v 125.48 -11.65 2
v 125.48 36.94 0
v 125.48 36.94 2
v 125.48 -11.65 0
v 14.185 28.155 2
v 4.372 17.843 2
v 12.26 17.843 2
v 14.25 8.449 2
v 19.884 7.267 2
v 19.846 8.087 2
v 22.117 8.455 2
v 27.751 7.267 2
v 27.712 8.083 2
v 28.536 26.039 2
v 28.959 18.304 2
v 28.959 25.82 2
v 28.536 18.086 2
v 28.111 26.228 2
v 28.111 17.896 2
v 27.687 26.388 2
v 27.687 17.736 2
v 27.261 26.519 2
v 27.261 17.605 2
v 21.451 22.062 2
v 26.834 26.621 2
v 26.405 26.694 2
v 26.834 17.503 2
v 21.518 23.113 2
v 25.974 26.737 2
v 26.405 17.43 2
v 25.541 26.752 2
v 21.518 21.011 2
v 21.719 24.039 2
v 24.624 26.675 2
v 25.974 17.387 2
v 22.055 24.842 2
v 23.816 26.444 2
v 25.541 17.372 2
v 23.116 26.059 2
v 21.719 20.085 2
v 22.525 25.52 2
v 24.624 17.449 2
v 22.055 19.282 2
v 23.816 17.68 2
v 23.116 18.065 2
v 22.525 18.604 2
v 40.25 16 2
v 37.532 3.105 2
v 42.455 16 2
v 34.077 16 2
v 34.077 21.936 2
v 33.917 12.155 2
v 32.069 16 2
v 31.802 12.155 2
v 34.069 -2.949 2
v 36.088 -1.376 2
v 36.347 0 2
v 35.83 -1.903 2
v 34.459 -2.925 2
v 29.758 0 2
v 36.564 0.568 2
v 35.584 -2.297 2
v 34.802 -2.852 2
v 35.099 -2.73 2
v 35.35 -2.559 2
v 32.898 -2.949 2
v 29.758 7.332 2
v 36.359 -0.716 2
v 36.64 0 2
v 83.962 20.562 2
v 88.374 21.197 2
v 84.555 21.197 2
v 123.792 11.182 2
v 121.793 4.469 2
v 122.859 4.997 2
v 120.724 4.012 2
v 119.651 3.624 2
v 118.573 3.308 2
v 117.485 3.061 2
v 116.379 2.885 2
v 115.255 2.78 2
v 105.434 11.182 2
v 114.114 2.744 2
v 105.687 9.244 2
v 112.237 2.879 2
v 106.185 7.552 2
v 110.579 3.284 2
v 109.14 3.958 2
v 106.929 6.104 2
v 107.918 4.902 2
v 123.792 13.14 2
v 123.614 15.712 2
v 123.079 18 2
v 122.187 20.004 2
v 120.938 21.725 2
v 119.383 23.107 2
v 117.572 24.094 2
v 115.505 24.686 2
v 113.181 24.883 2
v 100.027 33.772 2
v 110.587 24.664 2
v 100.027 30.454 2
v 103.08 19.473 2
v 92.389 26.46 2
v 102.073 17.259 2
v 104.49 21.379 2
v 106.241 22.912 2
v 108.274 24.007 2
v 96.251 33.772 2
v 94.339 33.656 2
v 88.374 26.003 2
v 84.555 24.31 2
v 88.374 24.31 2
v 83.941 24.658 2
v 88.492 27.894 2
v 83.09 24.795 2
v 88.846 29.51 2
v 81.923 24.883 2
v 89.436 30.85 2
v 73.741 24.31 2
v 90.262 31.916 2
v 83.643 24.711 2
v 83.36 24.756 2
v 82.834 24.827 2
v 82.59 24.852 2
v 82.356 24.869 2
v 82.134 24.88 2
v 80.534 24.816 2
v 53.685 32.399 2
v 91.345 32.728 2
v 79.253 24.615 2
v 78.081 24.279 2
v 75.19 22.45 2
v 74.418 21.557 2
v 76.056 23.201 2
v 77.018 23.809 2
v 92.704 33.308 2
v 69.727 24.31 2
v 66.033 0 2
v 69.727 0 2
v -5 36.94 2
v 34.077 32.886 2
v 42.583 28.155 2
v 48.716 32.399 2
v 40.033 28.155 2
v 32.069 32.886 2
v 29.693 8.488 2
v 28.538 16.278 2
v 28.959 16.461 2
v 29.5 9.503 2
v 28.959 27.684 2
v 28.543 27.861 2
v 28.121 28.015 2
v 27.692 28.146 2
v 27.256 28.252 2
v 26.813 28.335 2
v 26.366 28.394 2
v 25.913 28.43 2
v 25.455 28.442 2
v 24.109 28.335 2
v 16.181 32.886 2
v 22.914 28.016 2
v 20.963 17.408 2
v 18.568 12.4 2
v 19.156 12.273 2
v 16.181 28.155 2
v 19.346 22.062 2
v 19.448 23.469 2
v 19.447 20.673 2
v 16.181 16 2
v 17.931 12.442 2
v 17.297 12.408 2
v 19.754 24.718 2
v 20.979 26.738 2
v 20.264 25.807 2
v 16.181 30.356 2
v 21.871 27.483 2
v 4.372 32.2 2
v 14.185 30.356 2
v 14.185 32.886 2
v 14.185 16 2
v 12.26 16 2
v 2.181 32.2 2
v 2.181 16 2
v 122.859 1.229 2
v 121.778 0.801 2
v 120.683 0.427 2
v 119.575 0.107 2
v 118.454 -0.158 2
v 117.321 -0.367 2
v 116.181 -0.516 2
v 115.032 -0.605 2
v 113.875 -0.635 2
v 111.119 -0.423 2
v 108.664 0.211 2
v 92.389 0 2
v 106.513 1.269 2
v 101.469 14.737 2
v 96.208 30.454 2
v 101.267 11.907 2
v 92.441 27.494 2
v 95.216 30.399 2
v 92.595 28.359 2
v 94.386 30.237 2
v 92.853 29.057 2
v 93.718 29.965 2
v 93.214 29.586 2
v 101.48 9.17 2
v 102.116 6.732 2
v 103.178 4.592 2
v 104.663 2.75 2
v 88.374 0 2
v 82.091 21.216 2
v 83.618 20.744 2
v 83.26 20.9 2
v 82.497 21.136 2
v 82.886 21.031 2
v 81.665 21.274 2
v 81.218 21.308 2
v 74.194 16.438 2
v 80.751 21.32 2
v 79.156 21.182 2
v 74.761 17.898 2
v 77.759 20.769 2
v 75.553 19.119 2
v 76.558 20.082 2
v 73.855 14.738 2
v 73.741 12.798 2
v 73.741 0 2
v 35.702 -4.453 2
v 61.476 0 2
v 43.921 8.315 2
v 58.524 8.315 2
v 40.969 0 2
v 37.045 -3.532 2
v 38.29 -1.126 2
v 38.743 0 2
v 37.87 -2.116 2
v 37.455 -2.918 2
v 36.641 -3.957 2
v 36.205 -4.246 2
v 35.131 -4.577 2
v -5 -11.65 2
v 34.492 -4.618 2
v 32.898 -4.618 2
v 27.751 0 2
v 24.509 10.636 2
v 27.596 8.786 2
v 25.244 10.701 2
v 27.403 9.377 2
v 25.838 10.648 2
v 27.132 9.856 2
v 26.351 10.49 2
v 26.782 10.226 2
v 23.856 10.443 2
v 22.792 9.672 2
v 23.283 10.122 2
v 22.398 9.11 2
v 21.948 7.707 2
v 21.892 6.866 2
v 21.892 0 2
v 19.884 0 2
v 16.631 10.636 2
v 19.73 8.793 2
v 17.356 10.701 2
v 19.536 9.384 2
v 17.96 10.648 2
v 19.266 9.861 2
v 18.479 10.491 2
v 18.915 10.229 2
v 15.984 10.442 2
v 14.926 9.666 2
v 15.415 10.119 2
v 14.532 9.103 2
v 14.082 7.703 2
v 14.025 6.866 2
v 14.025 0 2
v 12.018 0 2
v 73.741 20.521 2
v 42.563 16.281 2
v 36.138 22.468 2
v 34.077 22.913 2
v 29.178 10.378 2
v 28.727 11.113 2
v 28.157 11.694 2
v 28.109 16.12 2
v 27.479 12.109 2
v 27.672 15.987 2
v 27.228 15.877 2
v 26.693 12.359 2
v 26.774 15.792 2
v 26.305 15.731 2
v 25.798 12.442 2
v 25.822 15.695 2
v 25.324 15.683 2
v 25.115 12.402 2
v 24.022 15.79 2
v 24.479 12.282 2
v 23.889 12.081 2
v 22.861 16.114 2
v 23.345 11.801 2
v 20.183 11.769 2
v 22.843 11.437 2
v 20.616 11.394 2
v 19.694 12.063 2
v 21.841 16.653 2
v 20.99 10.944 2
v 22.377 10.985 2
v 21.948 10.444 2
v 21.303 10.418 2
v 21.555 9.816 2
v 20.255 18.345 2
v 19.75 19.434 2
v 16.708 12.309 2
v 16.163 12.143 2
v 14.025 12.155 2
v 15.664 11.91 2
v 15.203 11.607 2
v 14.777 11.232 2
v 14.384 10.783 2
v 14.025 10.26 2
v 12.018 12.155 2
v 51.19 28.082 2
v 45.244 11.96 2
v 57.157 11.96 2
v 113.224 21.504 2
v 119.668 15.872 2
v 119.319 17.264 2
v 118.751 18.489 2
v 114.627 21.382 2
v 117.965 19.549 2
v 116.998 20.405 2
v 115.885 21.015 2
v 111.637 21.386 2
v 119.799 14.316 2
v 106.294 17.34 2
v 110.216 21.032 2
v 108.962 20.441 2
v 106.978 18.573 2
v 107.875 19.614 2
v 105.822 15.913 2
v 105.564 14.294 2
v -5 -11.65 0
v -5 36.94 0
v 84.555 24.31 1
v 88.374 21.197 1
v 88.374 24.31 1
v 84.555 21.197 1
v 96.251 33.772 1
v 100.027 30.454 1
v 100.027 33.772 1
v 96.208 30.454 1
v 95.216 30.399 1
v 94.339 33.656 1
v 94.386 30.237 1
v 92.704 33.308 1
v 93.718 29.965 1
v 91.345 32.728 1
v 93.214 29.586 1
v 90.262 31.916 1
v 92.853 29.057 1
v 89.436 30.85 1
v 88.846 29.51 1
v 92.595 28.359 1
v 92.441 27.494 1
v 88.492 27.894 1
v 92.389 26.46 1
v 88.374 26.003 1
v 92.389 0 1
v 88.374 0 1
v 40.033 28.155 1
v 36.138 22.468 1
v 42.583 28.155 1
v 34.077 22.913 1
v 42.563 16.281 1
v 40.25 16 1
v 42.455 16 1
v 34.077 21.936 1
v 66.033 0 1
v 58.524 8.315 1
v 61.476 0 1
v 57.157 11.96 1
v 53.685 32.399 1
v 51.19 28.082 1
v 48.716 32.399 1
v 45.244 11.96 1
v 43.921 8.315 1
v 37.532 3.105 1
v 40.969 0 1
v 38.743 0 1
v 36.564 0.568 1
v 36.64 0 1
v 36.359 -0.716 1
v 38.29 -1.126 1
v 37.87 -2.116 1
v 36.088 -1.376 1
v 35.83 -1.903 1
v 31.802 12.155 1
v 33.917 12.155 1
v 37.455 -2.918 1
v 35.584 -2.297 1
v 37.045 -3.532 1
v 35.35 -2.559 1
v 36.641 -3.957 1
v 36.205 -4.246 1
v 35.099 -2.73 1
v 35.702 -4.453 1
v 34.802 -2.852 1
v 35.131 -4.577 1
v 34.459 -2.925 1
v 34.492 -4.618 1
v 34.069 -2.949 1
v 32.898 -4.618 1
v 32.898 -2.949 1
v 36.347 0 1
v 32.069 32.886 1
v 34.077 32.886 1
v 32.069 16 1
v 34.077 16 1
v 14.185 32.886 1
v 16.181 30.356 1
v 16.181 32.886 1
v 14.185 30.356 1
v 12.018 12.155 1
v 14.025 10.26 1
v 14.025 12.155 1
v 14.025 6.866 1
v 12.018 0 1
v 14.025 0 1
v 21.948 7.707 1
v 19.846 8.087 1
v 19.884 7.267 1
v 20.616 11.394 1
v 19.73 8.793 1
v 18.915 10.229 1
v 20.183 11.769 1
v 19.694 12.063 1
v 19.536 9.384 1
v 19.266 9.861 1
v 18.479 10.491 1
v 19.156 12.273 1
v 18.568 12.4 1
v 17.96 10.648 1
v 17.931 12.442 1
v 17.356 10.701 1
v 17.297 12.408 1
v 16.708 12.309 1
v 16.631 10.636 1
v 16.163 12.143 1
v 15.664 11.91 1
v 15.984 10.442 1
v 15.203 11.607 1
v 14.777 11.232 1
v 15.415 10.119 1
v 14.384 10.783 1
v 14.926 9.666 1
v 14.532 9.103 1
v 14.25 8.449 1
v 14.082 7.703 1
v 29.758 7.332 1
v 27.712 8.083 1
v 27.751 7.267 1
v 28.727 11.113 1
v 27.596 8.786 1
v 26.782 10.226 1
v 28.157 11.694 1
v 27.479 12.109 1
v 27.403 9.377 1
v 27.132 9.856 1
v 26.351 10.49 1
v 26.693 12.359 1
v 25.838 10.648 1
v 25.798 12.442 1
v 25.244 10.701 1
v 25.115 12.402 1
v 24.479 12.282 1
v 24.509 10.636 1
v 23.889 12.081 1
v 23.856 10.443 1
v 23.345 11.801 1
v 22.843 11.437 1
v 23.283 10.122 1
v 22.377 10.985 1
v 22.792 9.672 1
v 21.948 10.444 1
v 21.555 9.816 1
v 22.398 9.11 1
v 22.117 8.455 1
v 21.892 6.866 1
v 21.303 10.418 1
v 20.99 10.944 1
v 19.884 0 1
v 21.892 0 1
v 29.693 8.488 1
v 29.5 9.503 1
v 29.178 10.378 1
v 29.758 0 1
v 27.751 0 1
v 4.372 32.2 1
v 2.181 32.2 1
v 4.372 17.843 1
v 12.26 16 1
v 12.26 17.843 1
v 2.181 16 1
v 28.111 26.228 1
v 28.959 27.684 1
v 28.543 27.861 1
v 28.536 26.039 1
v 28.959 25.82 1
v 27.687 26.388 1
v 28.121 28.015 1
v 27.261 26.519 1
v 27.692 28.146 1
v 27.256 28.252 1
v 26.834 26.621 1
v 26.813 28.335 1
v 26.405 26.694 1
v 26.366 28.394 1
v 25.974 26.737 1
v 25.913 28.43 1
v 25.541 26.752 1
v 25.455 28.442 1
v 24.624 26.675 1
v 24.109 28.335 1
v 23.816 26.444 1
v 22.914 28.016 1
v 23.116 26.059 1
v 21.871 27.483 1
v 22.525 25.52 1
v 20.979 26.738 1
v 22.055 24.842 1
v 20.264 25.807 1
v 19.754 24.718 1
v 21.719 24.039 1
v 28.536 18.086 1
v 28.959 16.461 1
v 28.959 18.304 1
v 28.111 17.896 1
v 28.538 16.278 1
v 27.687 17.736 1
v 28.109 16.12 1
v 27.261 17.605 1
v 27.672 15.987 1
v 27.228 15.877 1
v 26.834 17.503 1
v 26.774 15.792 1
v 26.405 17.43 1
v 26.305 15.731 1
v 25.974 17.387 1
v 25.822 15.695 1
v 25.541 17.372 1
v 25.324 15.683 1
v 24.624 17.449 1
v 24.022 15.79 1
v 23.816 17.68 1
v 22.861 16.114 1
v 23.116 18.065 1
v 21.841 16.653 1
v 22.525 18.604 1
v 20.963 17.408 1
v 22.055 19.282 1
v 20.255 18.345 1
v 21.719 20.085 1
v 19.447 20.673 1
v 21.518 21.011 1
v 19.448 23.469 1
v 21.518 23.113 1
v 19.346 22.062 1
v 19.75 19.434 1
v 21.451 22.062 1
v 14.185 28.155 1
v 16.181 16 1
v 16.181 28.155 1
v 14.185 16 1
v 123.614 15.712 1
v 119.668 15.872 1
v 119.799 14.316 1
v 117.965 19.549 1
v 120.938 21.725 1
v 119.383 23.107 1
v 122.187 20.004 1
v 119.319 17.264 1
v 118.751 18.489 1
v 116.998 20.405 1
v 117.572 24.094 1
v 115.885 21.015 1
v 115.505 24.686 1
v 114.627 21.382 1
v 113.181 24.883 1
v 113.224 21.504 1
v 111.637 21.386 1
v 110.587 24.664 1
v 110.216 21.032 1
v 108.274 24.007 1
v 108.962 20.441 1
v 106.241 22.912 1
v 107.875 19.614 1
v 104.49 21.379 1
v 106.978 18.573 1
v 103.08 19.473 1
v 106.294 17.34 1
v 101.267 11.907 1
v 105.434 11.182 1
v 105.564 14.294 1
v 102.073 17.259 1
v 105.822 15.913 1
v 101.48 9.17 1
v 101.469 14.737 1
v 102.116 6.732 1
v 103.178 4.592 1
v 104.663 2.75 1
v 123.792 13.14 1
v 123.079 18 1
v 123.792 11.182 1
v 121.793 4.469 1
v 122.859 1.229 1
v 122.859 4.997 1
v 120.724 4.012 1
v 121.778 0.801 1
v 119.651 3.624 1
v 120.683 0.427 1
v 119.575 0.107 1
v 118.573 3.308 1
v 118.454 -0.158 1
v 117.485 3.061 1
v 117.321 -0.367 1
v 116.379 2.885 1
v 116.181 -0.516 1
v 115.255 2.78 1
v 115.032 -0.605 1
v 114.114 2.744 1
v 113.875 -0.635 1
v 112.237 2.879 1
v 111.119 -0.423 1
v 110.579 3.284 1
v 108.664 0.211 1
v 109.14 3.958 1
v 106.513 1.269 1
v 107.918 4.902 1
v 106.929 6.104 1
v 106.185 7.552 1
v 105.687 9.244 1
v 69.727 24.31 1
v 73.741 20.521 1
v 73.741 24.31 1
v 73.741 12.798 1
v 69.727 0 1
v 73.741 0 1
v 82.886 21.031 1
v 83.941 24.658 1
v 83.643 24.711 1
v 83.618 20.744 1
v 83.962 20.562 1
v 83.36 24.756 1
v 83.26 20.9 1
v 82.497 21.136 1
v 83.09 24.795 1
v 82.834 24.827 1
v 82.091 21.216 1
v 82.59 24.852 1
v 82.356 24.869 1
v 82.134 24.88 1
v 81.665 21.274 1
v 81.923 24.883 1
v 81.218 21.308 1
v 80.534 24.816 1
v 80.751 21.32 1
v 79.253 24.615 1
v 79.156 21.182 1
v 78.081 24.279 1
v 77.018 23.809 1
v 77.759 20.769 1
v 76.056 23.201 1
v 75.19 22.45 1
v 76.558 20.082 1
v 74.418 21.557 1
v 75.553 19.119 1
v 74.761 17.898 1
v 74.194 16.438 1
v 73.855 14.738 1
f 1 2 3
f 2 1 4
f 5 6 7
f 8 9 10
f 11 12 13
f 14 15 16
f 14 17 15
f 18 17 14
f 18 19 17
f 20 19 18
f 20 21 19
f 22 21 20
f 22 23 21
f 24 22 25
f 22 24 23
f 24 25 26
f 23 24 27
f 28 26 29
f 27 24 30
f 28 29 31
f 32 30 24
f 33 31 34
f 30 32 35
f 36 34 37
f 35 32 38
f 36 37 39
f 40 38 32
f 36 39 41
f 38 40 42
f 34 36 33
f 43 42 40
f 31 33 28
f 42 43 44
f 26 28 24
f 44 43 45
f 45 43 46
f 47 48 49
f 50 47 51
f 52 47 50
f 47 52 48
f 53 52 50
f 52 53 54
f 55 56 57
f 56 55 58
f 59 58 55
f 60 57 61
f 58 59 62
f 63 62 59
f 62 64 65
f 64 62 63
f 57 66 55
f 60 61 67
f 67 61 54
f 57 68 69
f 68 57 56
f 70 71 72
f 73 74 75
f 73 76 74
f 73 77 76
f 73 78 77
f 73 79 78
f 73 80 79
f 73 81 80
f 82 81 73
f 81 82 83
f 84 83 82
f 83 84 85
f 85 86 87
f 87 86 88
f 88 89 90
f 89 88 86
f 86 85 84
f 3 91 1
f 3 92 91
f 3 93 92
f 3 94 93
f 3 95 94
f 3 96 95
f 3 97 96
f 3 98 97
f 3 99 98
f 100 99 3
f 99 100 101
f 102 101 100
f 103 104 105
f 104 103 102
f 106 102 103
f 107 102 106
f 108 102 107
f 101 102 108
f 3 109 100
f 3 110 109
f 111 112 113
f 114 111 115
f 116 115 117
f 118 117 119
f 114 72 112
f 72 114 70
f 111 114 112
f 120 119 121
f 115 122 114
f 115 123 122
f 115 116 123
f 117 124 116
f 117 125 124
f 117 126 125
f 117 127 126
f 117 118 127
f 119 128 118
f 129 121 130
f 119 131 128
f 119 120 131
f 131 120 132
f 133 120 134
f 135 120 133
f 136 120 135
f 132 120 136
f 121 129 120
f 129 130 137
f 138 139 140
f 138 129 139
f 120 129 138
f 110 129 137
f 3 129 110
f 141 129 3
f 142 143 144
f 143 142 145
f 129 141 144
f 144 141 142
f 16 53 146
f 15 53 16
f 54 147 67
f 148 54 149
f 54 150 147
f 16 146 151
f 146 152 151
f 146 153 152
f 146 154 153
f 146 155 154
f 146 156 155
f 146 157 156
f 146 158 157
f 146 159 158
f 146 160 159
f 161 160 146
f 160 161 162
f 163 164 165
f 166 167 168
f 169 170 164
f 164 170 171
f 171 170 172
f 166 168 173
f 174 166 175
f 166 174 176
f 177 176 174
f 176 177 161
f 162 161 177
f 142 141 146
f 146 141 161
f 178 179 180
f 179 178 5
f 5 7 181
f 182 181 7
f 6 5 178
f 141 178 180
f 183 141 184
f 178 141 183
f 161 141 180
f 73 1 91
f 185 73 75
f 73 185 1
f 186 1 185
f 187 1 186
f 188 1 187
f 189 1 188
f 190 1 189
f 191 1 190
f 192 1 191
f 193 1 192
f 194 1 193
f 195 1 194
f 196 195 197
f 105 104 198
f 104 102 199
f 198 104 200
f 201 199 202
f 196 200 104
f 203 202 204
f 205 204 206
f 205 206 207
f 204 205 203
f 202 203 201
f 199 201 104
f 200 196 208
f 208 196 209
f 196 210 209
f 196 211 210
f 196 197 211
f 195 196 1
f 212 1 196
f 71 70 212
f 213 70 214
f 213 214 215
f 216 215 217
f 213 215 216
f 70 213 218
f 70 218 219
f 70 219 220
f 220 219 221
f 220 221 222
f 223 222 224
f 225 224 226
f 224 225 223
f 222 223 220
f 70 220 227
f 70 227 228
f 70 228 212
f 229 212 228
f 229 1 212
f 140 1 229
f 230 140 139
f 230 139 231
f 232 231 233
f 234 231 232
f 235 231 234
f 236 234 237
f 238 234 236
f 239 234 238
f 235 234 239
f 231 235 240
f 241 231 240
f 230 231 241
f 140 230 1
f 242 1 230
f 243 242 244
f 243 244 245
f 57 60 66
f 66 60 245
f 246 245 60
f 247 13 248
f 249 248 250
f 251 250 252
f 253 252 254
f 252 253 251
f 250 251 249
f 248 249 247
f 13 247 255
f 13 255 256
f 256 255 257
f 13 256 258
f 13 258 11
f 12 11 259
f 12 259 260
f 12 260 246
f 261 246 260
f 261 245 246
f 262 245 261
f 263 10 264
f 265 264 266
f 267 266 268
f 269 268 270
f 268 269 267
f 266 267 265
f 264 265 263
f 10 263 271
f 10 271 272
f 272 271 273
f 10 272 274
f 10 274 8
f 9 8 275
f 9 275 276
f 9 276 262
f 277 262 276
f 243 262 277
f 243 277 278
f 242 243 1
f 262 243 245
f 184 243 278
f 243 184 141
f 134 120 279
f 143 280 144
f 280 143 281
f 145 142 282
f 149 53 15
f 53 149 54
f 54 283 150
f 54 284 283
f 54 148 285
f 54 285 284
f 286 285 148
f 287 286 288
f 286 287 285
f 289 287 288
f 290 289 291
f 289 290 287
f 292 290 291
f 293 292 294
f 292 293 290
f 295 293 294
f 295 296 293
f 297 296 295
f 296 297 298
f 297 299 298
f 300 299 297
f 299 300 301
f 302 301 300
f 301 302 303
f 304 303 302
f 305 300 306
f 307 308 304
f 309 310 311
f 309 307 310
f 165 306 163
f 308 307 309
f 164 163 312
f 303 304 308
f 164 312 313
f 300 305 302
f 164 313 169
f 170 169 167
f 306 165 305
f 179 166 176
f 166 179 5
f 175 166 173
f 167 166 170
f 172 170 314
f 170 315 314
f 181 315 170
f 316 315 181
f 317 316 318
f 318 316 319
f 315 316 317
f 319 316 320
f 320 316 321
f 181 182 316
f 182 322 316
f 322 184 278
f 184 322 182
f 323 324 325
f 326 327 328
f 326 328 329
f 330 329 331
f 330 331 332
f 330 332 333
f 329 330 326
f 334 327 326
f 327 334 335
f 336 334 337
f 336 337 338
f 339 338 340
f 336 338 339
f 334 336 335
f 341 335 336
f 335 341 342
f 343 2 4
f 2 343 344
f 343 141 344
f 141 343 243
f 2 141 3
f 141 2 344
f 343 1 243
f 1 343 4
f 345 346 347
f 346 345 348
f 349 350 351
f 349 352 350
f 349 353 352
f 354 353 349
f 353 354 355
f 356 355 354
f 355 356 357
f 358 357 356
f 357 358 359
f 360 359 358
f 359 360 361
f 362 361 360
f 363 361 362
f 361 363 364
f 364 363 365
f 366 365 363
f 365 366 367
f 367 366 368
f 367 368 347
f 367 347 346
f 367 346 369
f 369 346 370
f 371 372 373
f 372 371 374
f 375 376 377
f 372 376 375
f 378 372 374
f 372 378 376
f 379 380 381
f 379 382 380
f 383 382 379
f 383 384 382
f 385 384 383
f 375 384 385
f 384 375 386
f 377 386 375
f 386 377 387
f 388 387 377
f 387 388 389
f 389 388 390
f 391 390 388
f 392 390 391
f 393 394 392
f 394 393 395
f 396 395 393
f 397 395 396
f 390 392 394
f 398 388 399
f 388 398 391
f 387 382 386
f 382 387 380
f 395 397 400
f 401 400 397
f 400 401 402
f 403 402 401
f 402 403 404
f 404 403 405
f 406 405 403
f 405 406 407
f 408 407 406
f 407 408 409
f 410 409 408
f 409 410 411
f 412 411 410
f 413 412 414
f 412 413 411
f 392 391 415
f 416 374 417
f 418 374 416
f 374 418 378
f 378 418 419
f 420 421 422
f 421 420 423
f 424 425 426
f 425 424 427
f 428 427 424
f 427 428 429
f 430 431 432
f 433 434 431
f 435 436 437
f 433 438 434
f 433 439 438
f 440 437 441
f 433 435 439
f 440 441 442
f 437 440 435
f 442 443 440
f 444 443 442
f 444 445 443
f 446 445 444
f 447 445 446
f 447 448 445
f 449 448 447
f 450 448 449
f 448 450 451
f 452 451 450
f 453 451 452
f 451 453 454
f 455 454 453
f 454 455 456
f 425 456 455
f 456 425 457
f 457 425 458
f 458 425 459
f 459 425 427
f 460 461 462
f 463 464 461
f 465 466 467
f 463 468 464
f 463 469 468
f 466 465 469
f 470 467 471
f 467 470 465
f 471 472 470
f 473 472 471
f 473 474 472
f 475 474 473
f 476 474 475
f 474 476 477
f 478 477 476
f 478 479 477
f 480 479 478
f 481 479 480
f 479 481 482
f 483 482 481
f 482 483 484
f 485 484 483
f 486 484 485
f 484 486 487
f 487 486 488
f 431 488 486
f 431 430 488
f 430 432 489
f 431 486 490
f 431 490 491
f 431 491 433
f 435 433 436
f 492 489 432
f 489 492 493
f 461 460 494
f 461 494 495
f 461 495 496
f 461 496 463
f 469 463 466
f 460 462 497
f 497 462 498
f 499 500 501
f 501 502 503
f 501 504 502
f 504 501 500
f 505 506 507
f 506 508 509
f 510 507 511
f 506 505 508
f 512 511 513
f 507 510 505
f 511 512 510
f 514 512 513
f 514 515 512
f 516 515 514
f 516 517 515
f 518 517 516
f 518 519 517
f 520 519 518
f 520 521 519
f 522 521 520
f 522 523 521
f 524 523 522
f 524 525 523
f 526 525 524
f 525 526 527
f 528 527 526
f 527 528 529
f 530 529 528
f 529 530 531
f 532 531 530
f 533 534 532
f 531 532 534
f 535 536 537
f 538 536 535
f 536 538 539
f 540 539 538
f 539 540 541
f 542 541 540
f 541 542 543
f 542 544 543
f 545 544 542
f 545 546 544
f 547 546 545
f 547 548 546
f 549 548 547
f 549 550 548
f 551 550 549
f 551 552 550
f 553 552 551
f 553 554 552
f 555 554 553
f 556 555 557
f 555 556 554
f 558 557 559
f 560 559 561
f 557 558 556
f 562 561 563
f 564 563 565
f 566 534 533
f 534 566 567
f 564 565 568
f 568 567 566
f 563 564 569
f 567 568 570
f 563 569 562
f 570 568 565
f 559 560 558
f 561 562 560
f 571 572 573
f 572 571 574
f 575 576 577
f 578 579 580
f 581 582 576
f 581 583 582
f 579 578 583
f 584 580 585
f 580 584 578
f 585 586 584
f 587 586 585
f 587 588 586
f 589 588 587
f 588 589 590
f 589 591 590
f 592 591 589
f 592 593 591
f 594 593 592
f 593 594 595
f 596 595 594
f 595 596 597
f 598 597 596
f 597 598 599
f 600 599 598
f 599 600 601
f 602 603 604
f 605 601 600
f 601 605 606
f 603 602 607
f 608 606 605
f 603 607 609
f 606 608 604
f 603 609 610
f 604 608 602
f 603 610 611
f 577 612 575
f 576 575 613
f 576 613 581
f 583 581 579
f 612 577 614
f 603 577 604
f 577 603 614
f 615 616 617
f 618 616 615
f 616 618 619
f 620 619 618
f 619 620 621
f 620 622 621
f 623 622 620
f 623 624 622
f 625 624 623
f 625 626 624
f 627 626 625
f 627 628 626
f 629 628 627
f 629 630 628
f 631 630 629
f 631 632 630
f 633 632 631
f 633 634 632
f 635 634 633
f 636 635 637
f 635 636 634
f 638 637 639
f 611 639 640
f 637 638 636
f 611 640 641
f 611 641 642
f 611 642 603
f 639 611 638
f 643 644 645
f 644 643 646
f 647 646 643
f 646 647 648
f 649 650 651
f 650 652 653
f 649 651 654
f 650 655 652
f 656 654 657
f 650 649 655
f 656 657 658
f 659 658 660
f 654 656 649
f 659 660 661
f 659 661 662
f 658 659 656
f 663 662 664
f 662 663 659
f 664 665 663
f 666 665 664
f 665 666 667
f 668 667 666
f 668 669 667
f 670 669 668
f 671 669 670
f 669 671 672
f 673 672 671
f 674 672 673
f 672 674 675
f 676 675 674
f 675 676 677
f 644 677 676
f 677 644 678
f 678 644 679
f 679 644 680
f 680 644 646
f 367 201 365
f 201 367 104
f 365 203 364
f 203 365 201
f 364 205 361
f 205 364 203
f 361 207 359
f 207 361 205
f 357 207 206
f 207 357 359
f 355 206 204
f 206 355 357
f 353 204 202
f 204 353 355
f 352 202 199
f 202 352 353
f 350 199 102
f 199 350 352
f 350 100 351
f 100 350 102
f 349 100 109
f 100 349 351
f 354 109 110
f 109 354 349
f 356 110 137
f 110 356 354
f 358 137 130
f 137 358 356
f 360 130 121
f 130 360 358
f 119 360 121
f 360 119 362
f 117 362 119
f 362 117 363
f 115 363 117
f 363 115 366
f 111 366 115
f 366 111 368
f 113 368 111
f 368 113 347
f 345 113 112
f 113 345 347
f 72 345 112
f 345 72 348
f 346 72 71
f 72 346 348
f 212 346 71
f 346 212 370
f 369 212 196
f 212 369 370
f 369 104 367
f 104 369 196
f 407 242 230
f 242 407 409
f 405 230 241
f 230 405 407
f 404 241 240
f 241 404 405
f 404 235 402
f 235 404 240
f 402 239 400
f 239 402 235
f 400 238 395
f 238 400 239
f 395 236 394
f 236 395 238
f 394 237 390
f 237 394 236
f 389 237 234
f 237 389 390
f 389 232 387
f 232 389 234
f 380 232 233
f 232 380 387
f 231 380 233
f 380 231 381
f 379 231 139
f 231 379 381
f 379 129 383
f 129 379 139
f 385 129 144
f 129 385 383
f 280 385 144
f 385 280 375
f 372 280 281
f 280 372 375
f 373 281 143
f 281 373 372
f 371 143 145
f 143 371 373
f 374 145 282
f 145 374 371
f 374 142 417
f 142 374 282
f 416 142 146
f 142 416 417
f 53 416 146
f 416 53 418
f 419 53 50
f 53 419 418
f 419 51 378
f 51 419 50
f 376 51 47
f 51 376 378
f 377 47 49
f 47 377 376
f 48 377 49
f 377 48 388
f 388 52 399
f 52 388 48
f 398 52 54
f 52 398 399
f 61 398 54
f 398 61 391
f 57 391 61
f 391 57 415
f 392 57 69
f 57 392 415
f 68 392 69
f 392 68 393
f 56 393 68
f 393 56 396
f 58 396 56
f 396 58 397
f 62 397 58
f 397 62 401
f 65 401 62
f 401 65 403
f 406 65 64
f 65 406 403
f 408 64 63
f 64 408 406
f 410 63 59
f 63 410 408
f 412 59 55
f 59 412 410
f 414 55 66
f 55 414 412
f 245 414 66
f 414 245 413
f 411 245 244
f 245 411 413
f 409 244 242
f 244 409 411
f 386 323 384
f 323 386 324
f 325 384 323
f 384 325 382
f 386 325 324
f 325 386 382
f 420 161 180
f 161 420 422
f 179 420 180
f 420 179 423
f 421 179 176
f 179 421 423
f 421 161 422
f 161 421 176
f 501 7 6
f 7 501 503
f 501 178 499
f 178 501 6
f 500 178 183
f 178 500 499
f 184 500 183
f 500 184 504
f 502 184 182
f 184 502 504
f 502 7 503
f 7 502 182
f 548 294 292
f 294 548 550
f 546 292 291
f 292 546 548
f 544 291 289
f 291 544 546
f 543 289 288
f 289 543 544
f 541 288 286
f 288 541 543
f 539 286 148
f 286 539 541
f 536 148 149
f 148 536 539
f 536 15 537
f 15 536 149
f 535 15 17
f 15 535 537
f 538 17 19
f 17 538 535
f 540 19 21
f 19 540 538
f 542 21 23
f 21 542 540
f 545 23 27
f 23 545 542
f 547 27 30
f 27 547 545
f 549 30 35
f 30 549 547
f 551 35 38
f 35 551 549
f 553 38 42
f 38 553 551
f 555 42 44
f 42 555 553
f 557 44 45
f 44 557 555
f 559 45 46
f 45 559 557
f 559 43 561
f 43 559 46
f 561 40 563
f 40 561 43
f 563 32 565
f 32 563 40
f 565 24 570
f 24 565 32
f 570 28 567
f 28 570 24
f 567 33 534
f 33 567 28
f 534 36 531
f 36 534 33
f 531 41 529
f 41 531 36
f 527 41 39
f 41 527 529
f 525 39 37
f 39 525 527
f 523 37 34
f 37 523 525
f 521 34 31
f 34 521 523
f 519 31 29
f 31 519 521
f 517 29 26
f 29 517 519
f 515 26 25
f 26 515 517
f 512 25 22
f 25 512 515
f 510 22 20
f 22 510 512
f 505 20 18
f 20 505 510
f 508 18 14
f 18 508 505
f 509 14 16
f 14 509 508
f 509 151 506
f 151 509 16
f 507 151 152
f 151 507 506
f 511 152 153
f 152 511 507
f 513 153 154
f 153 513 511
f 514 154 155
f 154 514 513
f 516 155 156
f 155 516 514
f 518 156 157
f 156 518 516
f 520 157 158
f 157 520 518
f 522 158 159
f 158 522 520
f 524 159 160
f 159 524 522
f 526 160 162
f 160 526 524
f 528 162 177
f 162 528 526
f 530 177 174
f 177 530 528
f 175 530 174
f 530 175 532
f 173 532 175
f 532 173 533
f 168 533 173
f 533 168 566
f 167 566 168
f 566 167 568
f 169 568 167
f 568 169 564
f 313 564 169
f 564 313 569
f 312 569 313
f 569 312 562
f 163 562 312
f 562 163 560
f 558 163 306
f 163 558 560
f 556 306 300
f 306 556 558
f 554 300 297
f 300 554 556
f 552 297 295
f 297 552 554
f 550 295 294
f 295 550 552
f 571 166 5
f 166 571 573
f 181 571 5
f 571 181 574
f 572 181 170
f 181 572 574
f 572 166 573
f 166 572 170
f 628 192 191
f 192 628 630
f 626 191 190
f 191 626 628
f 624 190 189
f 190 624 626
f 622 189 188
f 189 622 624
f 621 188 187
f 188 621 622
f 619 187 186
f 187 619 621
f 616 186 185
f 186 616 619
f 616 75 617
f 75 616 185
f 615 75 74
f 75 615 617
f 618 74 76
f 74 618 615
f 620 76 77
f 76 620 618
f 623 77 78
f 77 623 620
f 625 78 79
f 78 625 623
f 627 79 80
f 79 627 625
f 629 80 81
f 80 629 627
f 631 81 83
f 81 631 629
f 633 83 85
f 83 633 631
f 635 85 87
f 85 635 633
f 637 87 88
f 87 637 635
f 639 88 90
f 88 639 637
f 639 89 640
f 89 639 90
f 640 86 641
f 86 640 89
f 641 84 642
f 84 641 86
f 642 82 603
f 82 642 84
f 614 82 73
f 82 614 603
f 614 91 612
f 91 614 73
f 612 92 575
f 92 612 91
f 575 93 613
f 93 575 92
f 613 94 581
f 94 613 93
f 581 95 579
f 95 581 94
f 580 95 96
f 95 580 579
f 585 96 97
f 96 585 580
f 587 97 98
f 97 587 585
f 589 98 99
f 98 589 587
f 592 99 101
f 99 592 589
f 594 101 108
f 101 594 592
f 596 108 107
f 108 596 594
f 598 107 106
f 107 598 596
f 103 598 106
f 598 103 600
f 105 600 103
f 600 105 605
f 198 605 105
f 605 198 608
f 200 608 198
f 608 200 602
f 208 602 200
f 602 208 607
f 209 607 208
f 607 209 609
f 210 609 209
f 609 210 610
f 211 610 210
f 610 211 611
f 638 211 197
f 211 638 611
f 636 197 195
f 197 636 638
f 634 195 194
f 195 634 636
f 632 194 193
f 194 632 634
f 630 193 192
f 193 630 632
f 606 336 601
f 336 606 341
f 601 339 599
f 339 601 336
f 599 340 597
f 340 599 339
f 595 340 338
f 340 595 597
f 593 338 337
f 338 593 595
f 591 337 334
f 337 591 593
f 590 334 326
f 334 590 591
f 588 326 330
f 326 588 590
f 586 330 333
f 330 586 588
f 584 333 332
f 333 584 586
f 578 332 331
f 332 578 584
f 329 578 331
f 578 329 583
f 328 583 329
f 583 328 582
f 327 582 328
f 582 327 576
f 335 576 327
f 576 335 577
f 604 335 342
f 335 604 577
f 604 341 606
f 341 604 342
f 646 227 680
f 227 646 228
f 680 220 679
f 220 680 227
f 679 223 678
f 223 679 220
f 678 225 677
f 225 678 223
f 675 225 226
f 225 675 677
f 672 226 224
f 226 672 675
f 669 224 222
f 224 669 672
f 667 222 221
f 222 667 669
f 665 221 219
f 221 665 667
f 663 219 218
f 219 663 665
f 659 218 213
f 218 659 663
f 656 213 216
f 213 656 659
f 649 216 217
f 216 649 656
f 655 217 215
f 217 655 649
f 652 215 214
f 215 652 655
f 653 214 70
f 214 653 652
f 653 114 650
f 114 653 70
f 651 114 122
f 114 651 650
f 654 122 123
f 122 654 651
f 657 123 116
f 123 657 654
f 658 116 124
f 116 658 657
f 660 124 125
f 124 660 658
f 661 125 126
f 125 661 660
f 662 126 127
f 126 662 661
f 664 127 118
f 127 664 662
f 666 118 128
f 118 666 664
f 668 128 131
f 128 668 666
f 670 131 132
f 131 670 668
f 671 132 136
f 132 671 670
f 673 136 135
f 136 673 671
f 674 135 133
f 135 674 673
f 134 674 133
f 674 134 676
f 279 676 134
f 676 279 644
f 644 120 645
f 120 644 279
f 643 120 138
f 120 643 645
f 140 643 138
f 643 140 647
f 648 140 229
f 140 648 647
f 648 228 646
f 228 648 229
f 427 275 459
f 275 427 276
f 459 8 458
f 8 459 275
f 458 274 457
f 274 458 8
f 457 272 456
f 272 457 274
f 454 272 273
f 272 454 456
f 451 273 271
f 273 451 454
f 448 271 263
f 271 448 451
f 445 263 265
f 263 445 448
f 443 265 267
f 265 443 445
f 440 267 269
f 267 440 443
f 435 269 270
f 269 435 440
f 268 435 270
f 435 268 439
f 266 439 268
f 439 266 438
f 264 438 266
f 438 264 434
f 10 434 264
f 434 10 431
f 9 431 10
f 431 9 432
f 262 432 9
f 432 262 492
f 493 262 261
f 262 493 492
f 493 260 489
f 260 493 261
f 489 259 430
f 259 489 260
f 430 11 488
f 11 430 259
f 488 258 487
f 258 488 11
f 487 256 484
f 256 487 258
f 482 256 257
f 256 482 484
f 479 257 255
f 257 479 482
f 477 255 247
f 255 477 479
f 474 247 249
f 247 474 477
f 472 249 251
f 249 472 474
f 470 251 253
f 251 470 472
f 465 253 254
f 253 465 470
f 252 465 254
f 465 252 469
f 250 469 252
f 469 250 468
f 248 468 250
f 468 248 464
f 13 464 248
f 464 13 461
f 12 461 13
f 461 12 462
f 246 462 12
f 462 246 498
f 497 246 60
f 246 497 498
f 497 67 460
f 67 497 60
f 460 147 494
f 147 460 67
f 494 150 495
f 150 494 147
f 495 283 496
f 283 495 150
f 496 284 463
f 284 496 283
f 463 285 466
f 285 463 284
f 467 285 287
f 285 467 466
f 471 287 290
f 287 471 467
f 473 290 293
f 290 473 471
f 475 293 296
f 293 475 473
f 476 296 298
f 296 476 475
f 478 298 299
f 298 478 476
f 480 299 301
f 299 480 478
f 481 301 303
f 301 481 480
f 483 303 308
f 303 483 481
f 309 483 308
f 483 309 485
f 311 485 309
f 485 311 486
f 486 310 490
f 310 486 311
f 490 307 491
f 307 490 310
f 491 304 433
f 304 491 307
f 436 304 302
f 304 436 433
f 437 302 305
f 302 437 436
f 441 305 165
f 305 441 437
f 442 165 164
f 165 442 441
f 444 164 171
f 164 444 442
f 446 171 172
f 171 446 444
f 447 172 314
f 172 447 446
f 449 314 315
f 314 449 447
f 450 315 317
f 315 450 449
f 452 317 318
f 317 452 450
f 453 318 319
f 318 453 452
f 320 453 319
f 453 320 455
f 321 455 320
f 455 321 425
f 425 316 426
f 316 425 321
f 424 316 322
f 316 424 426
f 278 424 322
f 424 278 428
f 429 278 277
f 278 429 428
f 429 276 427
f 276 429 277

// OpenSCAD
// -*- mode: SCAD ; c-file-style: "ellemtel" ; coding: utf-8 -*-
//
// Rudolf Koch's reply to requests for free samples of his work, translated
// to English
//
// (c) 2017 Roland Sieker <ospalh@gmail.com>
// Licence: CC-BY-SA 4.0


ms = 0.01;
// Muggeseggele (gnat's bollocks, in Swabian about as harmless as the
// phrase shown)

schwabacher = "Alte Schwabacher:style=Regular";

//
breite = 120.48;
tiefe = 38.59;
xo = 0 + breite/2;
yo = -6.65 + tiefe/2;

rand = 5;
hw = 2;  // Halter weite
hh = 0.5;

// swabian_greatings(1); // unconnected
// positive_greating();
negative_greating();
// quick_greating();

module positive_greating()
{
   plate(1);
   translate([0,0,1])
   {
      swabian_greatings(1);
   }
}

module negative_greating()
{
   difference()
   {
      plate(2);
      translate([0,0,1])
      {
         swabian_greatings(1+ms);
      }
   }
}

module quick_greating()
{
   connectors();
   swabian_greatings(1+hh);
}



module swabian_greatings(h)
{
   linear_extrude(h)
   {
      translate([0, 16])
      {
         text("Lick", font=schwabacher, size=16);
      }
      translate([10, 0])
      {
         text("my", font=schwabacher, size=16);
      }
      translate([36, -0])
      {
         text("Arſe!", font=schwabacher, size=32);
      }

   }
}


module plate(h)
{
   translate([xo,yo,h/2])
   {
      cube([breite+2*rand, tiefe+2*rand, h], center=true);
   }
}


module connectors()
{

   module wH(x, y, l)
   {
      // waagerechter Halter
      translate([x, y, hh/2])
      {
         cube([l, hw, hh], center=true);
      }
   }
   module sH(x, y, l)
   {
      // senkrechter Halter
      translate([x, y, hh/2])
      {
         cube([hw, l, hh], center=true);
      }
   }
   module dH(x, y, l)
   {
      // diagonaler Halter
      translate([x, y, hh/2])
      {
         rotate(-45)
         {
            cube([hw, l, hh], center=true);
         }
      }
   }
   module qH(x, y, l)
   {
      // diagonaler Halter (quer)
      translate([x, y, hh/2])
      {
         rotate(-45)
         {
            cube([l, hw, hh], center=true);
         }
      }
   }
   module xH(x, y, l, a)
   {
      // schraeger Halter
      translate([x, y, hh/2])
      {
         rotate(a)
         {
            cube([l, hw, hh], center=true);
         }
      }
   }

}
